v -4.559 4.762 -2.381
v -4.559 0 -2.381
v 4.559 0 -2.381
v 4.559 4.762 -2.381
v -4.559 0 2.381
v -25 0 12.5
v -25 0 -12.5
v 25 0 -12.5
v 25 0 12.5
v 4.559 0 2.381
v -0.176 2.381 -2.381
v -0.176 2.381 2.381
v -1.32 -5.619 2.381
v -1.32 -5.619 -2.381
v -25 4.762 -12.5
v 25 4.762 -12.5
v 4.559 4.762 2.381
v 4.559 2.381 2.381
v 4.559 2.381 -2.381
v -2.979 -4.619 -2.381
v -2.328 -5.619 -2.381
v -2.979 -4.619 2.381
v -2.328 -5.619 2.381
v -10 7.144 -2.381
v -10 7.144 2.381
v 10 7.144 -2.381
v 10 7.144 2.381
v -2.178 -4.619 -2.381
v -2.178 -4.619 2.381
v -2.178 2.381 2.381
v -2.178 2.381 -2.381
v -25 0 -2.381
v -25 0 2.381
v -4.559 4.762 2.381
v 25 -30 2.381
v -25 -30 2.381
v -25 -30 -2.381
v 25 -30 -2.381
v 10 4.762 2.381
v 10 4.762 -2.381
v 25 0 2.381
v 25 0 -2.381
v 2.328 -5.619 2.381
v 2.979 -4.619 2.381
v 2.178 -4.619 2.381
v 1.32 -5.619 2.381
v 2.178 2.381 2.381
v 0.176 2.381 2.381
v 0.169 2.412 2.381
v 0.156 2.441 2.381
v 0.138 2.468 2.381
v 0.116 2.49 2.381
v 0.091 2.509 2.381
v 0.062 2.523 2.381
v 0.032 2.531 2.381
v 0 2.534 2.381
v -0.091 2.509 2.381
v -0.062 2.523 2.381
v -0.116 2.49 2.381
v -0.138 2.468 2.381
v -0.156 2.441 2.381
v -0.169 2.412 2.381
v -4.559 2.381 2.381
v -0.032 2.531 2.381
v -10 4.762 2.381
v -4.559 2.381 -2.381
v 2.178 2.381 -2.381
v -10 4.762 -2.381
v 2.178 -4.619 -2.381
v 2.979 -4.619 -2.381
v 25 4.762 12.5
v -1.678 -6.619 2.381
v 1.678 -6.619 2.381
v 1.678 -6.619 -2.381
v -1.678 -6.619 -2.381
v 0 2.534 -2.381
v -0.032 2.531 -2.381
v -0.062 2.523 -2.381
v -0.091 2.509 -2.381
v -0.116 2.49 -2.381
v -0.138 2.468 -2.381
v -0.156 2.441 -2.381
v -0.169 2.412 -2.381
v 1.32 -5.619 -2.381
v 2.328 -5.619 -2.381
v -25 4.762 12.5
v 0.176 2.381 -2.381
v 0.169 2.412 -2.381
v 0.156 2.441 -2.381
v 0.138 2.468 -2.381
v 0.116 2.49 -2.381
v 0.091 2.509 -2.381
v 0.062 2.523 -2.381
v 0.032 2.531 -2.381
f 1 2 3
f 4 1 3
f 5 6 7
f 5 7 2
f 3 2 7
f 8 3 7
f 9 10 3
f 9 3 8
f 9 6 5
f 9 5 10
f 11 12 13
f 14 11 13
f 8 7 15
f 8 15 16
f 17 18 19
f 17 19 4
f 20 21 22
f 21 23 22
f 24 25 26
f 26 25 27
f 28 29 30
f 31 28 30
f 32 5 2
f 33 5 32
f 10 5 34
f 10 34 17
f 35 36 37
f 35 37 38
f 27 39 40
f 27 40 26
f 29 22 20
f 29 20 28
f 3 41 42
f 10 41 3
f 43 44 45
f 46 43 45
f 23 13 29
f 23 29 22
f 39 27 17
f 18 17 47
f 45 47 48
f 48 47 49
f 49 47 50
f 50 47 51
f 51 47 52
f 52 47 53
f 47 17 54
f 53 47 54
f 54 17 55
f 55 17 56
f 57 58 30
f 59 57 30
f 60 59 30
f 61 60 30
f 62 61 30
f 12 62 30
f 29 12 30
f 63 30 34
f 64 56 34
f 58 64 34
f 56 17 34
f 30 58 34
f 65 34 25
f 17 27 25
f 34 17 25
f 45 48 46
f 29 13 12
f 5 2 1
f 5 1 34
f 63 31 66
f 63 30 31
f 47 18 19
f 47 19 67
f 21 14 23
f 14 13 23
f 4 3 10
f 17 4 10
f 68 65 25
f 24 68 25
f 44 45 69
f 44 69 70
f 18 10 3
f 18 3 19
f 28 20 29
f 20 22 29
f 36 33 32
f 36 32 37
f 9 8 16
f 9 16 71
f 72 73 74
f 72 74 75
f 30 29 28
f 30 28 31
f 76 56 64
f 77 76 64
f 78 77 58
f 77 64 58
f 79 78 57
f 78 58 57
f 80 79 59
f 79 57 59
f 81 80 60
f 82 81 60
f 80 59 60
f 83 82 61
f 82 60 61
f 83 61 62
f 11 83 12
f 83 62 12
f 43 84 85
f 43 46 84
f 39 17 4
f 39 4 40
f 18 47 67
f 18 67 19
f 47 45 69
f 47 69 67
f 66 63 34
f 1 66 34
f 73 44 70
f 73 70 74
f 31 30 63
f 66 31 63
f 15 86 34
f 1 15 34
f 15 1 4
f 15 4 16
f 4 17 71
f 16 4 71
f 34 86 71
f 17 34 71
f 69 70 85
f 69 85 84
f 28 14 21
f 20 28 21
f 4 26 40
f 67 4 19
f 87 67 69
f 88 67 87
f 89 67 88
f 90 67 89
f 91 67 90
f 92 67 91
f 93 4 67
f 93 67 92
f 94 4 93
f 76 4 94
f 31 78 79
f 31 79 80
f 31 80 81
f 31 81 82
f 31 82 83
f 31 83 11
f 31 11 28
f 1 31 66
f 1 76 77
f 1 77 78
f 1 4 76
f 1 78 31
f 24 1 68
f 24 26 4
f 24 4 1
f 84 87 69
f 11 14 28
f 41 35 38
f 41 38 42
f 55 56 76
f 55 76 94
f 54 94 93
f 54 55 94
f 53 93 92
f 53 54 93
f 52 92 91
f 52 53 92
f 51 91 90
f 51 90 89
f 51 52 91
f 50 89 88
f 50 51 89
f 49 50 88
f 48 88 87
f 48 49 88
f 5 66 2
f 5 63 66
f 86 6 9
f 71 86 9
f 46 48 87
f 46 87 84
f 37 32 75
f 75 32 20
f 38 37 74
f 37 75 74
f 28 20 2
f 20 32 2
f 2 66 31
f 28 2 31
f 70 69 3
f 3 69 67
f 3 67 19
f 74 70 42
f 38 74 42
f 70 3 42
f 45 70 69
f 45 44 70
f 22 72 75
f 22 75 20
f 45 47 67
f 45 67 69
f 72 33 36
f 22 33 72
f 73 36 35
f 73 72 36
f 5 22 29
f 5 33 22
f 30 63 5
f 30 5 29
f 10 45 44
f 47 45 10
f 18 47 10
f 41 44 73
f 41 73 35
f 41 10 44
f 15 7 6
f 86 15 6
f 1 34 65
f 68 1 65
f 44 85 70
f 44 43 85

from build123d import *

# Parameters (mm, degrees)
F2_DEPTH = 2.38125
F3_W     = 50
F3_H     = 25
F3_W_2   = 9.1181
F3_H_2   = 4.7625
F4_DEPTH = 4.7625
F6_DEPTH = 2.38125


# Not quite as in the source:
# - a length typed as a fraction of an inch, garbled in the dataset ("3 / 203.2 mm" for 3/8 in), is restored


with BuildPart() as f2:
    # F1 (on Top) → F2 (new body, symmetric)
    with BuildSketch(Plane.XY):
        Polygon((-4.55905, 0), (-25, 0), (-25, -30), (0, -30), (25, -30), (25, 0), (4.55905, 0), (4.55905, 2.38125), (2.1778, 2.38125), (2.1778, -4.61875), (2.97895, -4.61875), (1.6778, -6.61875), (-1.6778, -6.61875), (-2.97895, -4.61875), (-2.1778, -4.61875), (-2.1778, 2.38125), (-4.55905, 2.38125), align=None)
    extrude(amount=F2_DEPTH, both=True)


with BuildPart() as f4:
    # F3 (on Front) → F4 (new body)
    with BuildSketch(Plane.XZ):
        Rectangle(F3_W, F3_H)
        Rectangle(F3_W_2, F3_H_2, mode=Mode.SUBTRACT)
    extrude(amount=-F4_DEPTH)


with BuildPart() as f6:
    # F5 (on Top) → F6 (new body, symmetric)
    with BuildSketch(Plane.XY):
        with BuildLine():
            Line((2.97895, -4.61875), (2.1778, -4.61875))
            Line((2.1778, -4.61875), (2.1778, 2.38125))
            Line((2.1778, 2.38125), (4.55905, 2.38125))
            Line((4.55905, 2.38125), (4.55905, 4.7625))
            Line((4.55905, 4.7625), (10, 4.7625))
            Line((10, 4.7625), (10, 7.14375))
            Line((10, 7.14375), (0, 7.14375))
            Line((0, 7.14375), (0, 2.5338832274))
            ThreePointArc((0, 2.5338832274), (0.1164864538, 2.4904102391), (0.1760098678, 2.38125))
            Line((0.1760098678, 2.38125), (1.3198899433, -5.61875))
            Line((1.3198899433, -5.61875), (2.328375, -5.61875))
            Line((2.328375, -5.61875), (2.97895, -4.61875))
        make_face()
    extrude(amount=F6_DEPTH, both=True)

    # F7: F6 across face


with BuildPart() as f6_1:
    add(f6.part)
    add(f6.part.mirror(Plane(origin=(0, 4.8388166137, 0), x_dir=(0, -1, 0), z_dir=(-1, 0, 0))))


solid = Compound([f2.part, f4.part, f6_1.part])
